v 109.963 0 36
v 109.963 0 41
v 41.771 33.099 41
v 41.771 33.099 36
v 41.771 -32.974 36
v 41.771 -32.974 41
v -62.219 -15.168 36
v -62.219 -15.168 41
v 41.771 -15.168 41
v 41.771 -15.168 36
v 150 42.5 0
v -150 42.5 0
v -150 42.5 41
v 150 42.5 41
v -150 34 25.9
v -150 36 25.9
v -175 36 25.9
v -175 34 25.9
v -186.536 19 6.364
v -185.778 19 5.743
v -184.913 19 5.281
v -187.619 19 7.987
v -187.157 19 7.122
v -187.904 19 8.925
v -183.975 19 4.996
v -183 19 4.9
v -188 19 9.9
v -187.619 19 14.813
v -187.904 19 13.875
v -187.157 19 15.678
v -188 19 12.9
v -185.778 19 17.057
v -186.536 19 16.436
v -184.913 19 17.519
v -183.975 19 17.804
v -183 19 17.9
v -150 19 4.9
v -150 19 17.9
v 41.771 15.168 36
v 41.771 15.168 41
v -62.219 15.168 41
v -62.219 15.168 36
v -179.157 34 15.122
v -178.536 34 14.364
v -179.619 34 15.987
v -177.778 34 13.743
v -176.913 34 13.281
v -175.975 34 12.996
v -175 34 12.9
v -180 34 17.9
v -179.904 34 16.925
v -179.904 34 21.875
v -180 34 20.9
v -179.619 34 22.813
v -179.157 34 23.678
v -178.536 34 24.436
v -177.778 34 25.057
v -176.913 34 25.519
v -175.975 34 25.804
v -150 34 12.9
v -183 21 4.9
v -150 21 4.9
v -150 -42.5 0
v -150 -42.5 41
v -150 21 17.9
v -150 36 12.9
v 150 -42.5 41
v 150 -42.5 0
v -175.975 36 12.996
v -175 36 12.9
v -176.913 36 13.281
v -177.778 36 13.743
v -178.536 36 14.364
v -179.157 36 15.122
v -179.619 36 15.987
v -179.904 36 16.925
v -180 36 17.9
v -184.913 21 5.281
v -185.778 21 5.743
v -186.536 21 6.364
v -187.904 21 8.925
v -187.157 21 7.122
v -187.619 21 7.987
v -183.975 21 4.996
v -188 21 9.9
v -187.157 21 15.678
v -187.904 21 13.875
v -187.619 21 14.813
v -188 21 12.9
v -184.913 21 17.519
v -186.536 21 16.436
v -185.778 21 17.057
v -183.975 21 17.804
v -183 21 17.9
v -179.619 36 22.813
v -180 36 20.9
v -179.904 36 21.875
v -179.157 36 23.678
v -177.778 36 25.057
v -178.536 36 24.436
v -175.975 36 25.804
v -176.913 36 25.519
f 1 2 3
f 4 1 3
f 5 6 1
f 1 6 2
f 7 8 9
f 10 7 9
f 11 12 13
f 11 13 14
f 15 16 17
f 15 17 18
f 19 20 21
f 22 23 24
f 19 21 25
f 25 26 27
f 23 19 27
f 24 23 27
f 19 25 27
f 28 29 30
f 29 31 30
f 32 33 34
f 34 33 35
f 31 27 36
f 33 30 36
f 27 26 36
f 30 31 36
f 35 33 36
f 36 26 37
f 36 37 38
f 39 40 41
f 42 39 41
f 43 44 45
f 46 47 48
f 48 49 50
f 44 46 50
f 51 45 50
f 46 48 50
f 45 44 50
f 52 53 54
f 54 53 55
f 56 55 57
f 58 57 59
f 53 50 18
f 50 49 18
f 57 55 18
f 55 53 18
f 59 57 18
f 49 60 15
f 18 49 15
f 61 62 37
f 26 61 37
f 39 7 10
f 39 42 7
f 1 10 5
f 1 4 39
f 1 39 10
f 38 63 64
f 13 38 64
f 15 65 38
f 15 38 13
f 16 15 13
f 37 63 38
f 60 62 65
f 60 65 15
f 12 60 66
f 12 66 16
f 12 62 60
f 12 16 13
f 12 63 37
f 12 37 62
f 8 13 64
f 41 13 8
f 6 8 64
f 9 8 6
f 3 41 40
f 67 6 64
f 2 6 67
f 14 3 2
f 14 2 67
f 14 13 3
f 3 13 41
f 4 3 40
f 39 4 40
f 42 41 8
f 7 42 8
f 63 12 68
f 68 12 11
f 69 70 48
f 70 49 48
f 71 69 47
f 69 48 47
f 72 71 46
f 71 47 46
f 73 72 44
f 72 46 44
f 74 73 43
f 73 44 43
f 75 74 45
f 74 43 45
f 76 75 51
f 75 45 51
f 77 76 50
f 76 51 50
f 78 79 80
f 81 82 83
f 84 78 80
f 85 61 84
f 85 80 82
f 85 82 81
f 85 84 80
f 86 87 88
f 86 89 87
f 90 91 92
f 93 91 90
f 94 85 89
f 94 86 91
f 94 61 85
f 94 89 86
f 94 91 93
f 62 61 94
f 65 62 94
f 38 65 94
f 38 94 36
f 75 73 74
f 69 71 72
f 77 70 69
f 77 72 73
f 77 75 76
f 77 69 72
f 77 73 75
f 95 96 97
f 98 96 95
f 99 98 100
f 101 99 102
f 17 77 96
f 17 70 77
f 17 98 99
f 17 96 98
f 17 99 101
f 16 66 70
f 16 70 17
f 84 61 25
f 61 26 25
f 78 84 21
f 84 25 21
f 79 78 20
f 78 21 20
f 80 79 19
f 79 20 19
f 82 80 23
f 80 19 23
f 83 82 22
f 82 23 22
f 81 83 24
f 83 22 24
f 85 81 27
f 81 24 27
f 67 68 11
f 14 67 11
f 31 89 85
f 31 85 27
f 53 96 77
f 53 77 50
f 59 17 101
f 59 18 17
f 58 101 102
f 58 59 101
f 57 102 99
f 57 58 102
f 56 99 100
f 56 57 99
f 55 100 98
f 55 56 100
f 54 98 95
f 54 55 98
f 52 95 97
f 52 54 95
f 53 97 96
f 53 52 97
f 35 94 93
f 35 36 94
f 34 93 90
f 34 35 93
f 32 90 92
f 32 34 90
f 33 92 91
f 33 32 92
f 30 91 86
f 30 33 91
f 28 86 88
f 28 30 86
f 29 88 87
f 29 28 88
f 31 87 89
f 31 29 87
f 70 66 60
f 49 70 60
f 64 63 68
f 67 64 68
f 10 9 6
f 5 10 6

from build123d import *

# Parameters (mm, degrees)
F0_W     = 300
F0_H     = 85
F1_DEPTH = 41
F3_W     = 2
F3_H     = 13
F4_DEPTH = 38
F2_W     = 2
F2_H     = 13
F5_DEPTH = 30
F6_R     = 5
F7_R     = 5
F9_DEPTH = 5


with BuildPart() as f1:
    # F0 (on Top) → F1 (new body)
    with BuildSketch(Plane.XY):
        Rectangle(F0_W, F0_H)
    extrude(amount=F1_DEPTH)

    # F3 (on face) → F4 (join)
    with BuildSketch(Plane(origin=(-150, 0, 0), x_dir=(0, -1, 0), z_dir=(-1, 0, 0))):
        with Locations((-20, 11.4)):
            Rectangle(F3_W, F3_H)
    extrude(amount=F4_DEPTH)

    # F2 (on face) → F5 (join)
    with BuildSketch(Plane(origin=(-150, 0, 0), x_dir=(0, -1, 0), z_dir=(-1, 0, 0))):
        with Locations((-35, 19.4)):
            Rectangle(F2_W, F2_H)
    extrude(amount=F5_DEPTH)

    # F6
    f6_edges = [f1.edges().sort_by_distance(p)[0] for p in [
        (-180, 35, 25.9),
        (-180, 35, 12.9),
    ]]
    fillet(f6_edges, radius=F6_R)

    # F7
    f7_edges = [f1.edges().sort_by_distance(p)[0] for p in [
        (-188, 20, 17.9),
        (-188, 20, 4.9),
    ]]
    fillet(f7_edges, radius=F7_R)

    # F8 (on face) → F9 (cut)
    with BuildSketch(Plane.XY.offset(41)):
        Polygon((-62.218837, -15.168179), (41.771069, -15.168179), (41.771069, -32.973677), (109.962918, 0), (41.771069, 33.099085), (41.771069, 15.168179), (-62.218837, 15.168179), align=None)
    extrude(amount=-F9_DEPTH, mode=Mode.SUBTRACT)


solid = f1.part
